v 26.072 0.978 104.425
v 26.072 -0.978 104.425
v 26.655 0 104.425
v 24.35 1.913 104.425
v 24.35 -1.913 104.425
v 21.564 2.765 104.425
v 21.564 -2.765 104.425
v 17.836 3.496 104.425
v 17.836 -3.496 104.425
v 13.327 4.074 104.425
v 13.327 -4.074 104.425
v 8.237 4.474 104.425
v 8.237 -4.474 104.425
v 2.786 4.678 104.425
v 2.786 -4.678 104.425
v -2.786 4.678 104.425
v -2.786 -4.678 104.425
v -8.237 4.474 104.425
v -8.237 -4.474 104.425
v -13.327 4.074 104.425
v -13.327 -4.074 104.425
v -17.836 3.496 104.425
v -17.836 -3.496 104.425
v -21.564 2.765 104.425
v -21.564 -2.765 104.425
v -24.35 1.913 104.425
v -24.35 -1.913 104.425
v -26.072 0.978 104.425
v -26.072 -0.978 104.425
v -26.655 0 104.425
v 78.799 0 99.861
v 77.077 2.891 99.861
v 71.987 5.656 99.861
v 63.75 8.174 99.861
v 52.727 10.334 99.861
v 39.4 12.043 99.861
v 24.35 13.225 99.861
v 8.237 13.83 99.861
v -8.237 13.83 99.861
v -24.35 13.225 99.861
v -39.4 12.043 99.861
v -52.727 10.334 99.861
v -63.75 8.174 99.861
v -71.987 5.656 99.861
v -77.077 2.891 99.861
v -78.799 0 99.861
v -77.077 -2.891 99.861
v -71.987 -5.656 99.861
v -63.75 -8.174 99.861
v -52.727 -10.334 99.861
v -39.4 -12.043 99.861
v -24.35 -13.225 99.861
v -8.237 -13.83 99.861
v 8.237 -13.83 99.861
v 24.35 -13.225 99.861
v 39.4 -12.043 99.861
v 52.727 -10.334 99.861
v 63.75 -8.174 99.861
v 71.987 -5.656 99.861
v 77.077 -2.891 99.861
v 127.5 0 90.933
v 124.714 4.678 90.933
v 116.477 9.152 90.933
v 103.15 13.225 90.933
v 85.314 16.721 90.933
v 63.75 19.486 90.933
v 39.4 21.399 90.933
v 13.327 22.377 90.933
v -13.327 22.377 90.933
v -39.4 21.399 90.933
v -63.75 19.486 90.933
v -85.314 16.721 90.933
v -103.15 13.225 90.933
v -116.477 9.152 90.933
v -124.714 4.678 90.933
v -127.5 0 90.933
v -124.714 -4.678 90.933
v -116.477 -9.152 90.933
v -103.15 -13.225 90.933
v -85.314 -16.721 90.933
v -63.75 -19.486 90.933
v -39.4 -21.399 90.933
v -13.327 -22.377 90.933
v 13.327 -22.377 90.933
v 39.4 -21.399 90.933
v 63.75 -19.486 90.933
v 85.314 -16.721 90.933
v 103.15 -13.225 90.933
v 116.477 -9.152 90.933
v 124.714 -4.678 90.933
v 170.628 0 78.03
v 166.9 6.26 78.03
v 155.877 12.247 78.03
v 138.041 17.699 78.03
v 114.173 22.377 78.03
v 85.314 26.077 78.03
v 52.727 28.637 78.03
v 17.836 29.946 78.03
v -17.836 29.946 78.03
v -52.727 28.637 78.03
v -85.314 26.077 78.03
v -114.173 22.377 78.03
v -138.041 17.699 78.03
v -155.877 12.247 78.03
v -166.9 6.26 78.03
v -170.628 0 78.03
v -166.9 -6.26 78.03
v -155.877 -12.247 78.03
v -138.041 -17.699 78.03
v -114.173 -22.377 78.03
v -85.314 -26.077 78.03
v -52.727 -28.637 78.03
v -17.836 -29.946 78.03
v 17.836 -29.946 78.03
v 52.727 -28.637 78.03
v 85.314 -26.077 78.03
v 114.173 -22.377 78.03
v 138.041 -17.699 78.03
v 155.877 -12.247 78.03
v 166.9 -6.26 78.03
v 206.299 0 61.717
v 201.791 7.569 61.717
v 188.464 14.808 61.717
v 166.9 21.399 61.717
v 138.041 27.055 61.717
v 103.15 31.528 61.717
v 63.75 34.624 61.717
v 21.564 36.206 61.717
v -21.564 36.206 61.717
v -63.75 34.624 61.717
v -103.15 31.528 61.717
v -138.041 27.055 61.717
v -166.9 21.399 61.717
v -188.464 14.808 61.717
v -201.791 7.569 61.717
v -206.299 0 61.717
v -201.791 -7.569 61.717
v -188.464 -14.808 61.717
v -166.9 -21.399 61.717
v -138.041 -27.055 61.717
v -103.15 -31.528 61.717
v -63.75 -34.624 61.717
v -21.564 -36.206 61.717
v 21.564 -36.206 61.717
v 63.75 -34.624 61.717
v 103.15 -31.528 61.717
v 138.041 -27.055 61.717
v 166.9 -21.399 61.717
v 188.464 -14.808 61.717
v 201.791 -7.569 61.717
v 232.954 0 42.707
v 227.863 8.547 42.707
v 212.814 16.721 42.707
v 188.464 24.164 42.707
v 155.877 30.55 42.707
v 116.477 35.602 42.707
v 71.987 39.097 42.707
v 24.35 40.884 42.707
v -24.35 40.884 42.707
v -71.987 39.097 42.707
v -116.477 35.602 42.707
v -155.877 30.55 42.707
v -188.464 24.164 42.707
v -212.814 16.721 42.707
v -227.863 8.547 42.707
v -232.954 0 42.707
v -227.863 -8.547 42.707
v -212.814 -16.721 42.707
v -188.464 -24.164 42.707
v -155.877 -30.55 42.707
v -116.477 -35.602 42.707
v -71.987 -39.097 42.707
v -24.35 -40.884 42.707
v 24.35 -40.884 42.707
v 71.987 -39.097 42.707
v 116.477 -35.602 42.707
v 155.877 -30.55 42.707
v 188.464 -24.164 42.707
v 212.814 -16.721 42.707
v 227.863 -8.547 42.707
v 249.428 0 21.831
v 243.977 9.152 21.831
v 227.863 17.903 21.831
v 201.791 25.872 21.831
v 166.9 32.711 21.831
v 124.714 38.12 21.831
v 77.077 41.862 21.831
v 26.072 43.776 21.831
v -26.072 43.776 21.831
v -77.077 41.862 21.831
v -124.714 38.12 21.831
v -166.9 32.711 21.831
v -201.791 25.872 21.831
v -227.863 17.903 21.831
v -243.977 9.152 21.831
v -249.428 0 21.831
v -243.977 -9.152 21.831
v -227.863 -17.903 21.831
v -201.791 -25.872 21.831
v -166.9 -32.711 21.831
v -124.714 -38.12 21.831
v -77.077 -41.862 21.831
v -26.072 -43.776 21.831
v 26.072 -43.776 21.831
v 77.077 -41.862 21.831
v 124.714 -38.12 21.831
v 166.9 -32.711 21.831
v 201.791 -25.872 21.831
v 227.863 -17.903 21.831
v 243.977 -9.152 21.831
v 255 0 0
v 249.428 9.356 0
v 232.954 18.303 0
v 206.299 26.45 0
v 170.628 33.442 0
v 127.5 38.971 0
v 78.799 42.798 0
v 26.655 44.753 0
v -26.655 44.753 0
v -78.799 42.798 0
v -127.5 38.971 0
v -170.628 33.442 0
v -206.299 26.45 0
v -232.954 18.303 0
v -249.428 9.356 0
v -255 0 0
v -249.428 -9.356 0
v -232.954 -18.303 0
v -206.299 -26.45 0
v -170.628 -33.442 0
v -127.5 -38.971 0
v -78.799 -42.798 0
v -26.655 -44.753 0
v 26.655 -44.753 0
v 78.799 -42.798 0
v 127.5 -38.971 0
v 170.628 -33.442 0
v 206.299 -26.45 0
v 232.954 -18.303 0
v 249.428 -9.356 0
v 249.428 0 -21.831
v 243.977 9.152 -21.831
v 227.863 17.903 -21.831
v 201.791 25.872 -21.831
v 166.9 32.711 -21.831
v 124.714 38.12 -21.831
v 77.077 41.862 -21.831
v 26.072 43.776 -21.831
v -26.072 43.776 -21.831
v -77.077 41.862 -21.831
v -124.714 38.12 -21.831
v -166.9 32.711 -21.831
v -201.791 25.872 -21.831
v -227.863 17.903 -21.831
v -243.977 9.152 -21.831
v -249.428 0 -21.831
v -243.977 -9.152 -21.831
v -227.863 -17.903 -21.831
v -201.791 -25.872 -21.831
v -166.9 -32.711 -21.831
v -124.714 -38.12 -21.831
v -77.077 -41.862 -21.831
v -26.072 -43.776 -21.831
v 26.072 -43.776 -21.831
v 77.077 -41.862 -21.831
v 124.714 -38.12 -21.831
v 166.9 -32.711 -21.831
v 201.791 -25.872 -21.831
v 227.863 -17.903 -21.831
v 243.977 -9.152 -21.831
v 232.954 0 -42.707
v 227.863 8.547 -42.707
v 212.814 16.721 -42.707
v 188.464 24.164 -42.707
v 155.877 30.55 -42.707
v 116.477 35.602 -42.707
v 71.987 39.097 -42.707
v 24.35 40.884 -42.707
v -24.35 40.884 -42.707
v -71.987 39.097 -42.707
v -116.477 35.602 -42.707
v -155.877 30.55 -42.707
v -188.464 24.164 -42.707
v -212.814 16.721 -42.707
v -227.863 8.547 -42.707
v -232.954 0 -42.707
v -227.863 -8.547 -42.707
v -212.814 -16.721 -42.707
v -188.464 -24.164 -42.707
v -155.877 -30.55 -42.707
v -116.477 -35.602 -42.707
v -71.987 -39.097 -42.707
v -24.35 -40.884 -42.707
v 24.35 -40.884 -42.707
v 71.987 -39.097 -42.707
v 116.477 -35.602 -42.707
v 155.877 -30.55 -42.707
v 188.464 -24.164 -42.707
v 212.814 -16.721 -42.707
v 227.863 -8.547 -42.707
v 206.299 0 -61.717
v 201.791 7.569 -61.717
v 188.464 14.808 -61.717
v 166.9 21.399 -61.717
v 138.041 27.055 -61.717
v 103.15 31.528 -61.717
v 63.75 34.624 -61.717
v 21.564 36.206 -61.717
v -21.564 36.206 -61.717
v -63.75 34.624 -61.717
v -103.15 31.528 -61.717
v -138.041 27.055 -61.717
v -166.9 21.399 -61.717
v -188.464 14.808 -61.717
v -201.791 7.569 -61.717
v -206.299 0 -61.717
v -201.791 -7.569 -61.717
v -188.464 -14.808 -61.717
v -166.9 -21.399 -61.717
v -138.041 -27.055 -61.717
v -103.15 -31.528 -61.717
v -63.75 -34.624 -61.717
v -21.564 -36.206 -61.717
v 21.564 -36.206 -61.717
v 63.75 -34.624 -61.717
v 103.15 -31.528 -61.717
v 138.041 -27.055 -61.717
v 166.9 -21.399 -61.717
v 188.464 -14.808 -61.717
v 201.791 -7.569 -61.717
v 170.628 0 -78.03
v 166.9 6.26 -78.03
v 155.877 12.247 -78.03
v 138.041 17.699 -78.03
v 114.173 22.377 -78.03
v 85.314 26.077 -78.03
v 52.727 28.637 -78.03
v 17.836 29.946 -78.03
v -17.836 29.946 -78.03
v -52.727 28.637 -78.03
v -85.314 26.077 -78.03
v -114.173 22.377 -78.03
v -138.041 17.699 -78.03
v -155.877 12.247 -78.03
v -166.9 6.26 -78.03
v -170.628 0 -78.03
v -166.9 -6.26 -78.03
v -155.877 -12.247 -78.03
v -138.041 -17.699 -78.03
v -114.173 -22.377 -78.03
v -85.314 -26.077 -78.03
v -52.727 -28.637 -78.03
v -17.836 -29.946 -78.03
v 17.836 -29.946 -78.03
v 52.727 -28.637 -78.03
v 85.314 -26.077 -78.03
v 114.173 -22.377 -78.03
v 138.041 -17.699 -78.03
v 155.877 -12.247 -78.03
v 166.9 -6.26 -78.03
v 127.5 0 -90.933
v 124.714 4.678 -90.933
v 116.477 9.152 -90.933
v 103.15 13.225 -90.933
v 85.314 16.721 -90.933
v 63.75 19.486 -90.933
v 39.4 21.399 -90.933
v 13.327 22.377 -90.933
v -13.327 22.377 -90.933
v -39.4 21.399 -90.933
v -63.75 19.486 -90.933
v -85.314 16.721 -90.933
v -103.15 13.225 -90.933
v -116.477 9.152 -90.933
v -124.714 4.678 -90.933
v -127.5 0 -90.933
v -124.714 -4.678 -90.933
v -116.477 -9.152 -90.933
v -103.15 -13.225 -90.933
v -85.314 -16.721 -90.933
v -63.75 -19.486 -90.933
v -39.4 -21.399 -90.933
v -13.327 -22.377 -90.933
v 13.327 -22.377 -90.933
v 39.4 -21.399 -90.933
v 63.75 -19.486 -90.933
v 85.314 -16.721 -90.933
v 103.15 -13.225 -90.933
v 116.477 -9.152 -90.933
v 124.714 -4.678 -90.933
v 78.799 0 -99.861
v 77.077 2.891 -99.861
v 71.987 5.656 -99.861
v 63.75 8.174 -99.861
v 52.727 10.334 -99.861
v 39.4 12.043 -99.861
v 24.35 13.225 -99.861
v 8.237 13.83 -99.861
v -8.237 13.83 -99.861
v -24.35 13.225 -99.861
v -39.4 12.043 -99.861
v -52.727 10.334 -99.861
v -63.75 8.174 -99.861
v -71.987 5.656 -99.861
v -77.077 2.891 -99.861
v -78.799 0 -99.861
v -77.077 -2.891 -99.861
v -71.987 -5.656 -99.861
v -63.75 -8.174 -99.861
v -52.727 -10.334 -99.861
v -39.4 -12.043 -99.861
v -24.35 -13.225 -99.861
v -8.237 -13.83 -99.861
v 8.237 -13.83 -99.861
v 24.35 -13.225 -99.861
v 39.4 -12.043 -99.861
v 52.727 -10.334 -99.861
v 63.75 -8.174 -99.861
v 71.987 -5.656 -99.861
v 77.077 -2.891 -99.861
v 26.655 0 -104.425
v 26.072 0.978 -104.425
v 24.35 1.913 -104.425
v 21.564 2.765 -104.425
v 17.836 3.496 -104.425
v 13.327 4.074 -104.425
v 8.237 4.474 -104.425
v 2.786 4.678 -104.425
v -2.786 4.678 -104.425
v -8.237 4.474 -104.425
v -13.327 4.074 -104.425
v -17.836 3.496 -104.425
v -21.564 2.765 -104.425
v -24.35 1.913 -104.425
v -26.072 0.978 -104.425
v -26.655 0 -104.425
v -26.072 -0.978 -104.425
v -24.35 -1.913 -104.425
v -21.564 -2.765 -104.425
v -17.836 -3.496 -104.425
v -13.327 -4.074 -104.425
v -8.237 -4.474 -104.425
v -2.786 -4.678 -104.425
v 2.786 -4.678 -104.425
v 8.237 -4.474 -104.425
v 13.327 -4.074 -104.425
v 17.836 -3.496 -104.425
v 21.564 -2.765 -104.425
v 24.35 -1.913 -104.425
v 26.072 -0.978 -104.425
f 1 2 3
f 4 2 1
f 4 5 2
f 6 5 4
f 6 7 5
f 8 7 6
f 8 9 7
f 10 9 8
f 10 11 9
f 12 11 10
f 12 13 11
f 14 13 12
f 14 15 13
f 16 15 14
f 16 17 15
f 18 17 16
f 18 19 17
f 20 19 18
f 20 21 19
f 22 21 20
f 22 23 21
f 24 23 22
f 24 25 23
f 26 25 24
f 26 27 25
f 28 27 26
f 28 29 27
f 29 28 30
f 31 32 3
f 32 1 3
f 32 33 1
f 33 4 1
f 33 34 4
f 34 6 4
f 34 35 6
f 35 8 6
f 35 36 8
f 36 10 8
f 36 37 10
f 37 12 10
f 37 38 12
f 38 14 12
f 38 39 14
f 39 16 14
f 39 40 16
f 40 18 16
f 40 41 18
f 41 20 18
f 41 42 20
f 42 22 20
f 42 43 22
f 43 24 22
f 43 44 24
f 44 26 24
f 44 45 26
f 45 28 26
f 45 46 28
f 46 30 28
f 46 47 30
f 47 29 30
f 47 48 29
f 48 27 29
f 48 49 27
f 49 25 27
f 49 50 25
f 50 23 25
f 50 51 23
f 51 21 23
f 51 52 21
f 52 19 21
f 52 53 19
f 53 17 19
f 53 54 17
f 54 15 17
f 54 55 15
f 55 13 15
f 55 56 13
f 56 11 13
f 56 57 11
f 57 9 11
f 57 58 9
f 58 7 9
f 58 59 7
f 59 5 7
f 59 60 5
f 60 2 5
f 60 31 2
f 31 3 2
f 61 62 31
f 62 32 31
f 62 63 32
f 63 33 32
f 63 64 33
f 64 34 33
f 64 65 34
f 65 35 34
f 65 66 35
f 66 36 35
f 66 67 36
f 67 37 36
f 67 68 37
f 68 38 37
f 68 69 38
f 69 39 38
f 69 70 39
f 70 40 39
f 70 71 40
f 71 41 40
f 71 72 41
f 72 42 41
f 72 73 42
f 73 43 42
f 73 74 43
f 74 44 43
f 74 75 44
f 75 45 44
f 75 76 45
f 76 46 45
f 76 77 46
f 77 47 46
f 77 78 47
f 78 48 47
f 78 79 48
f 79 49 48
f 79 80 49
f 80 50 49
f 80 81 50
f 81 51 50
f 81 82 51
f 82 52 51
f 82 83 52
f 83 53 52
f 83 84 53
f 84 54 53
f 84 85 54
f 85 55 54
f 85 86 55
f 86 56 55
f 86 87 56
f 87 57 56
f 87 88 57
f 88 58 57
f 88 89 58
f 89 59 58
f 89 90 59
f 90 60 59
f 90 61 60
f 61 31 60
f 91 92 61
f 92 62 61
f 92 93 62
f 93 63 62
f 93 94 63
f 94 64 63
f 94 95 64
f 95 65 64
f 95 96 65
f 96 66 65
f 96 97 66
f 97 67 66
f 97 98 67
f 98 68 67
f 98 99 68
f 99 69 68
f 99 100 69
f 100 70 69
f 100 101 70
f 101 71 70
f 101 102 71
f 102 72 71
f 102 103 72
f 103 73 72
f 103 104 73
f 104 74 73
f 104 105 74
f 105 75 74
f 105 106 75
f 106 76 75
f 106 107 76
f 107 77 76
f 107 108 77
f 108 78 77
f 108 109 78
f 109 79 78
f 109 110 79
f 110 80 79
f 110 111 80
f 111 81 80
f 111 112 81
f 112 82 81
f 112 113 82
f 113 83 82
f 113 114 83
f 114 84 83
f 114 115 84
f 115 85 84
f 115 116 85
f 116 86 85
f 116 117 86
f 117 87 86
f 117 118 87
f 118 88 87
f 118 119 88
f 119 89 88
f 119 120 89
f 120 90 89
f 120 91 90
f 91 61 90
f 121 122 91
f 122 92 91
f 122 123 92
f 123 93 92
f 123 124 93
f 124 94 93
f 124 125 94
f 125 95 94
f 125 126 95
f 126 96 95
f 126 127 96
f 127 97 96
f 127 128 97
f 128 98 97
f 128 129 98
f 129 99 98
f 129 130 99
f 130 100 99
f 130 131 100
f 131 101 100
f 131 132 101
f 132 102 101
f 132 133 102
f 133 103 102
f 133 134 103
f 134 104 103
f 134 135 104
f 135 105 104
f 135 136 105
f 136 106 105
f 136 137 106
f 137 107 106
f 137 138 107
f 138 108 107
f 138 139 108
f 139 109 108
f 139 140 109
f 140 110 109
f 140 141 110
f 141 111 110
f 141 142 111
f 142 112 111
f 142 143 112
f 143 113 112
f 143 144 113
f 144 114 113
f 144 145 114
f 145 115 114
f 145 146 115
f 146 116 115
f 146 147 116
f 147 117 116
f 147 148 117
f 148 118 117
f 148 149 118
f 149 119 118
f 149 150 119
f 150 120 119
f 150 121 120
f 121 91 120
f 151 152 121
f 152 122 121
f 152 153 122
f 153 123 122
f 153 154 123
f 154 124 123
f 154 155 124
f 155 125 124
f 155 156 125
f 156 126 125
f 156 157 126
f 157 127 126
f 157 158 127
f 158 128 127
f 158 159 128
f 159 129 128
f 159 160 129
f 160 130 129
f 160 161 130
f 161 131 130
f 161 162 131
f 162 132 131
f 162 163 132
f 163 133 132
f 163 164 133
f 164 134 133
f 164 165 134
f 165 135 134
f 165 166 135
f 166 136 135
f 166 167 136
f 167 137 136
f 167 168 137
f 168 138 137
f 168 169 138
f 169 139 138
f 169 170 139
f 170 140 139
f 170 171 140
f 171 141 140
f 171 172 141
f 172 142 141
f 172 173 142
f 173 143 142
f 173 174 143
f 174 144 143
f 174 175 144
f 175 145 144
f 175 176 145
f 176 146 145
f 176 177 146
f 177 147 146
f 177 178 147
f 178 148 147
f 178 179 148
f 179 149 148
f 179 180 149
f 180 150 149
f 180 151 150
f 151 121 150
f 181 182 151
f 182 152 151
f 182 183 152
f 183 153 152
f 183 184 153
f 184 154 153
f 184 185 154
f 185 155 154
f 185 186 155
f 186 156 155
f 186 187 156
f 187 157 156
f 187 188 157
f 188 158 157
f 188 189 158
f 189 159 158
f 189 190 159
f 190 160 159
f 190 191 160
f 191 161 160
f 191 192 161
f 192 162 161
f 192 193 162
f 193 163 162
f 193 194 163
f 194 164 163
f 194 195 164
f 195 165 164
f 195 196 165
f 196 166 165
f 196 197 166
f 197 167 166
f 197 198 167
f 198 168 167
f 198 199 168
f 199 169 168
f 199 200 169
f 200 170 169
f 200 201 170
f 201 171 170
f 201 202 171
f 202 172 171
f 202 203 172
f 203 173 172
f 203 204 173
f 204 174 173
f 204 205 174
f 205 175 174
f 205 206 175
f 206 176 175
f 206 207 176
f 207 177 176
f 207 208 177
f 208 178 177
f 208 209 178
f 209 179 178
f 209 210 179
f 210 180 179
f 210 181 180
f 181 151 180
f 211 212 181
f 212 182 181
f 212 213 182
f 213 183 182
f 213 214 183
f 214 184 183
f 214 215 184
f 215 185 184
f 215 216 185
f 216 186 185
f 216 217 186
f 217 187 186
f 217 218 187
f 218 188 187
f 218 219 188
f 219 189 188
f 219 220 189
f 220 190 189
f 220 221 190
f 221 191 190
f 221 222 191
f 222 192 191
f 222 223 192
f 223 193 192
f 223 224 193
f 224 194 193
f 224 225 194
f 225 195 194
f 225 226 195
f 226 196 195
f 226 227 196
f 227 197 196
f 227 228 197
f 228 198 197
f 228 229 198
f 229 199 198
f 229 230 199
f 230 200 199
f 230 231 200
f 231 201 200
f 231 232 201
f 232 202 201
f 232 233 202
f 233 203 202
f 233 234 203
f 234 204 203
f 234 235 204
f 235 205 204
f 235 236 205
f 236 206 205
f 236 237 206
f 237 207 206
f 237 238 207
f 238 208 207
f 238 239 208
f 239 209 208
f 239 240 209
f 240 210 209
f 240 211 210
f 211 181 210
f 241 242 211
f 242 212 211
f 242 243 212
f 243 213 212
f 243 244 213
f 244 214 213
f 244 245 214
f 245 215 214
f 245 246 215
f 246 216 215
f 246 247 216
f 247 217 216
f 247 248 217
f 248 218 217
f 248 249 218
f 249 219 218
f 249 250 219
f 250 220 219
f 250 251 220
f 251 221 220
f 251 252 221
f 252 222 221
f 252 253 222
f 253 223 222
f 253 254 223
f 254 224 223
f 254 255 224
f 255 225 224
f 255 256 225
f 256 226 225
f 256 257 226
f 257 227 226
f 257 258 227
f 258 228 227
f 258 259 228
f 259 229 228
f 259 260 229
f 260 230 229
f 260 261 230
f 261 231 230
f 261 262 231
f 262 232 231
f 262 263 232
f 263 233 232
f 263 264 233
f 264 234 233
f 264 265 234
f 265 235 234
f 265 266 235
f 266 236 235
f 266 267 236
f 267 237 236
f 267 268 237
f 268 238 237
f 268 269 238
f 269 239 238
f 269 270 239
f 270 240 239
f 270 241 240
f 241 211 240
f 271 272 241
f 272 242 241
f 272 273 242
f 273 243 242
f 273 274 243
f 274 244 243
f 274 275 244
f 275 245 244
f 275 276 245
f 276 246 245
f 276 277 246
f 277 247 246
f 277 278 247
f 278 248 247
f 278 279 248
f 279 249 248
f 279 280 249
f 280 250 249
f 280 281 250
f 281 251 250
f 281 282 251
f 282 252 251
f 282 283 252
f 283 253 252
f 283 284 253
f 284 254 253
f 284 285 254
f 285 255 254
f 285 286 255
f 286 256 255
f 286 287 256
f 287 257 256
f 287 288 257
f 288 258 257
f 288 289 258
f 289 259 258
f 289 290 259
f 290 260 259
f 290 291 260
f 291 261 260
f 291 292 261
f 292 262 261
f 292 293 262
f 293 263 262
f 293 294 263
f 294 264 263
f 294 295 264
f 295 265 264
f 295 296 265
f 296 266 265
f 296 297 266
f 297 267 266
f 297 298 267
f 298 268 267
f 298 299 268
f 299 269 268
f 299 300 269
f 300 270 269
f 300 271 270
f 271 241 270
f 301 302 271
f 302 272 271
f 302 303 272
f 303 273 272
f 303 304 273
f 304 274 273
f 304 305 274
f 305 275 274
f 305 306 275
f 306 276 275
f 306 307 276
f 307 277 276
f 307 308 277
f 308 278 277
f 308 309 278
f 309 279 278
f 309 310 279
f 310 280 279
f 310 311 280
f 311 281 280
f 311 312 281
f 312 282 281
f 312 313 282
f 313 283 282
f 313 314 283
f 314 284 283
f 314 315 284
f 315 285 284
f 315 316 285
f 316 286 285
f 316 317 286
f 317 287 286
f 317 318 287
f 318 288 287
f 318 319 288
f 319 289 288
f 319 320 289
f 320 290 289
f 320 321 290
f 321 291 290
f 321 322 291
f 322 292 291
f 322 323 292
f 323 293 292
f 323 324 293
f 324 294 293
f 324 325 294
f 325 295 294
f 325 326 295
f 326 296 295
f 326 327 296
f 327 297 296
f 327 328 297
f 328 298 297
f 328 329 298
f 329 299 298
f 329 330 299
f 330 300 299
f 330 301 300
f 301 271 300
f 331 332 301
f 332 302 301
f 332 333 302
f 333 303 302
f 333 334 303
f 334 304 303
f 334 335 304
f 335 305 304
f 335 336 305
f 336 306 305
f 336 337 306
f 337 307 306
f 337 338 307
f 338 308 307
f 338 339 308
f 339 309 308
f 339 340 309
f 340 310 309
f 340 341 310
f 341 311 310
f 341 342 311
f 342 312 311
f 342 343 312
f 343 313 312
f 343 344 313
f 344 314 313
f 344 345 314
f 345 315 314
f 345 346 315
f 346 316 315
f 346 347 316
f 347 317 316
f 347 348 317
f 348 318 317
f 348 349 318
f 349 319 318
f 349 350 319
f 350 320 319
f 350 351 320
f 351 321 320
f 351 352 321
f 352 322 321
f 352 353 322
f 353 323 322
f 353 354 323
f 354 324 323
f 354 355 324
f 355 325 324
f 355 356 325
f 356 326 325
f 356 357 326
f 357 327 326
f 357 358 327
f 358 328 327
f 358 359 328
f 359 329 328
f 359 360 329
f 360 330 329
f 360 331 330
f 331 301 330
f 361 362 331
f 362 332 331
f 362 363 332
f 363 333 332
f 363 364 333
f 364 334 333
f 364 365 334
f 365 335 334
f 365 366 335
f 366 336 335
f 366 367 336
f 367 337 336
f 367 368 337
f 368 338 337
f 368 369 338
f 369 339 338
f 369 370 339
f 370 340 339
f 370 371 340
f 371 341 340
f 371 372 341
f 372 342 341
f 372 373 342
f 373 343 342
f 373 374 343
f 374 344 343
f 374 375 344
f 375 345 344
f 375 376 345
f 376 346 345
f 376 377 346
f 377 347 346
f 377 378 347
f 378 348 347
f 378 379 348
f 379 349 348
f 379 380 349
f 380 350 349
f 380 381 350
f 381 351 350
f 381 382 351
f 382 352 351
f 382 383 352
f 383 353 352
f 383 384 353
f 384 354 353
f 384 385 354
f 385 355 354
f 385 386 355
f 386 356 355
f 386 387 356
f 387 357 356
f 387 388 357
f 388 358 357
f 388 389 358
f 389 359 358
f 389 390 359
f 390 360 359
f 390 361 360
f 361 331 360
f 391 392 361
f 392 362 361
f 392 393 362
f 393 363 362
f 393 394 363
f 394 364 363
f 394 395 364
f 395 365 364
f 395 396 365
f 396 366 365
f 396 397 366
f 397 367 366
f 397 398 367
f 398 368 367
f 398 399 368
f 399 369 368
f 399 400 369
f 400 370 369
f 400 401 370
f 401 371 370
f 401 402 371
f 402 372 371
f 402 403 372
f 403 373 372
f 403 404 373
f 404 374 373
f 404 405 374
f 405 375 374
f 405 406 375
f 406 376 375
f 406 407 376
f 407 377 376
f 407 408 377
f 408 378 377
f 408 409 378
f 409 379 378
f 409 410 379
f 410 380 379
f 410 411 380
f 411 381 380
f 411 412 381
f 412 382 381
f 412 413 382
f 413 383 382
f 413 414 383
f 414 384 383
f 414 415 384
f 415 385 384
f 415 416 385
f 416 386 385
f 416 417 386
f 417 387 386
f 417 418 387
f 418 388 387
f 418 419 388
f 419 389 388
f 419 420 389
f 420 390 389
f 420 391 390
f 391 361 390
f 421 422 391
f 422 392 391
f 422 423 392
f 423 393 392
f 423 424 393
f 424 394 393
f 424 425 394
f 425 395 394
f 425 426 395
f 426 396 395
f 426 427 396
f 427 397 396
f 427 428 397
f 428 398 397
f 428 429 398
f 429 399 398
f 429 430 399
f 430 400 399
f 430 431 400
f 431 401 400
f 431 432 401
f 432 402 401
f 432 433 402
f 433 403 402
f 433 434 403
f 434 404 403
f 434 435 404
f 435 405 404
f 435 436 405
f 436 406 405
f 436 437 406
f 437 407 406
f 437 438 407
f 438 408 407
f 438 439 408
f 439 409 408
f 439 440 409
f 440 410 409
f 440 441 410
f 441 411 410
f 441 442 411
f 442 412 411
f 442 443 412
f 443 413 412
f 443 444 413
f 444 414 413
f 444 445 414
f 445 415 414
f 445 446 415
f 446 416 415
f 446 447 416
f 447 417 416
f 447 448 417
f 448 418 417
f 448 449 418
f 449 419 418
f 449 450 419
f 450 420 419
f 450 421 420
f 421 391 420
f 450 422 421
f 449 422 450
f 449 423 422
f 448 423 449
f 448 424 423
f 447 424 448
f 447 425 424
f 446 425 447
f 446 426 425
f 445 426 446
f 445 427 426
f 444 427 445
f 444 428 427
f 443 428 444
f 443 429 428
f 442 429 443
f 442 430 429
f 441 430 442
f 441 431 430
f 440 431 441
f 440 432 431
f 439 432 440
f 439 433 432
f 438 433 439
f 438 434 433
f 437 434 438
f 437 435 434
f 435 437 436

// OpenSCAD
// Generated by SolidPython 1.0.1 on 2020-07-29 00:46:52


scale(v = [17, 3, 7]) {
	sphere(r = 15);
}
/***********************************************
*********      SolidPython code:      **********
************************************************
 
# import packages: SolidPython
from solid import *
from solid.utils import *
from itertools import chain, combinations, permutations


class Resize:

    def __init__(self, scad_file):
        self.scad_file = scad_file
        #self.scad_file = import_scad(scad_file)
        # cone/cylinder param:
        self.r1 = 0
        self.r2 = 0
        self.h = 0
        # rectangular prism param:
        self.w = 0
        self.l = 0
        # ellipse param:
        self.r = 0

    # import OpenScad code (file name corresponds to shape)


    # classify shape + parameters
    def assign(self, param1, param2, param3):
        if self.scad_file == 'cone.scad':
            self.r1 = param1
            self.r2 = param2
            self.h = param3
        elif self.scad_file == 'cylinder.scad':
            self.r1 = param1
            self.r2 = param2
            self.h = param3
        elif self.scad_file == 'rectangularPrism.scad':
            self.h = param1
            self.l = param2
            self.w = param3
        else:
            self.r = param1
            self.h = param2

    # resize parameters
    def iterate(self):
        x = range(3, 20, 2)
        i = 1
        if self.scad_file == 'cone.scad':
            tempList = list(permutations(x, 2))
            for temp in tempList:
                param1 = temp[0]
                param2 = temp[1]
                filepath = 'produced_scad_files/' + 'cone' + str(param1) + '_' + str(param2) + '_' + '.scad'
                scad_render_to_file(cylinder(h=param1, r1=param2, r2=0), filepath)

        elif self.scad_file == 'cylinder.scad':
            tempList = list(permutations(x, 3))
            for temp in tempList:
                param1 = temp[0]
                param2 = temp[1]
                filepath = 'produced_scad_files/' + 'cylinder' + str(param1) + '_' + str(param2) + '_' + '.scad'
                scad_render_to_file(cylinder(h=param1, r1=param2, r2=param2), filepath)

        elif self.scad_file == 'rectangularPrism.scad':
            tempList = list(permutations(x, 3))
            for temp in tempList:
                param1 = temp[0]
                param2 = temp[1]
                param3 = temp[2]
                filepath = 'produced_scad_files/' + 'rectangularPrism' + str(param1) + '_' + str(param2) + '_' + str(
                    param3) + '.scad'
                scad_render_to_file(cube(size=(param1, param2, param3)), filepath)

        elif self.scad_file == 'ellipse.scad':
            tempList = list(permutations(x, 4))
            for temp in tempList:
                param1 = temp[0]
                param2 = temp[1]
                param3 = temp[2]
                param4 = temp[3]
                filepath = 'produced_scad_files/' + 'ellipse' + str(param1) + '_' + str(param2) + '_' + str(param3) + '_' + str(param4) + '.scad'
                scad_render_to_file(scale([param1, param2, param3])(sphere(r=param4)), filepath)

    def render_to_scadfile(self):
        scad_render_to_file(scad, 'example.scad') 
 
************************************************/
